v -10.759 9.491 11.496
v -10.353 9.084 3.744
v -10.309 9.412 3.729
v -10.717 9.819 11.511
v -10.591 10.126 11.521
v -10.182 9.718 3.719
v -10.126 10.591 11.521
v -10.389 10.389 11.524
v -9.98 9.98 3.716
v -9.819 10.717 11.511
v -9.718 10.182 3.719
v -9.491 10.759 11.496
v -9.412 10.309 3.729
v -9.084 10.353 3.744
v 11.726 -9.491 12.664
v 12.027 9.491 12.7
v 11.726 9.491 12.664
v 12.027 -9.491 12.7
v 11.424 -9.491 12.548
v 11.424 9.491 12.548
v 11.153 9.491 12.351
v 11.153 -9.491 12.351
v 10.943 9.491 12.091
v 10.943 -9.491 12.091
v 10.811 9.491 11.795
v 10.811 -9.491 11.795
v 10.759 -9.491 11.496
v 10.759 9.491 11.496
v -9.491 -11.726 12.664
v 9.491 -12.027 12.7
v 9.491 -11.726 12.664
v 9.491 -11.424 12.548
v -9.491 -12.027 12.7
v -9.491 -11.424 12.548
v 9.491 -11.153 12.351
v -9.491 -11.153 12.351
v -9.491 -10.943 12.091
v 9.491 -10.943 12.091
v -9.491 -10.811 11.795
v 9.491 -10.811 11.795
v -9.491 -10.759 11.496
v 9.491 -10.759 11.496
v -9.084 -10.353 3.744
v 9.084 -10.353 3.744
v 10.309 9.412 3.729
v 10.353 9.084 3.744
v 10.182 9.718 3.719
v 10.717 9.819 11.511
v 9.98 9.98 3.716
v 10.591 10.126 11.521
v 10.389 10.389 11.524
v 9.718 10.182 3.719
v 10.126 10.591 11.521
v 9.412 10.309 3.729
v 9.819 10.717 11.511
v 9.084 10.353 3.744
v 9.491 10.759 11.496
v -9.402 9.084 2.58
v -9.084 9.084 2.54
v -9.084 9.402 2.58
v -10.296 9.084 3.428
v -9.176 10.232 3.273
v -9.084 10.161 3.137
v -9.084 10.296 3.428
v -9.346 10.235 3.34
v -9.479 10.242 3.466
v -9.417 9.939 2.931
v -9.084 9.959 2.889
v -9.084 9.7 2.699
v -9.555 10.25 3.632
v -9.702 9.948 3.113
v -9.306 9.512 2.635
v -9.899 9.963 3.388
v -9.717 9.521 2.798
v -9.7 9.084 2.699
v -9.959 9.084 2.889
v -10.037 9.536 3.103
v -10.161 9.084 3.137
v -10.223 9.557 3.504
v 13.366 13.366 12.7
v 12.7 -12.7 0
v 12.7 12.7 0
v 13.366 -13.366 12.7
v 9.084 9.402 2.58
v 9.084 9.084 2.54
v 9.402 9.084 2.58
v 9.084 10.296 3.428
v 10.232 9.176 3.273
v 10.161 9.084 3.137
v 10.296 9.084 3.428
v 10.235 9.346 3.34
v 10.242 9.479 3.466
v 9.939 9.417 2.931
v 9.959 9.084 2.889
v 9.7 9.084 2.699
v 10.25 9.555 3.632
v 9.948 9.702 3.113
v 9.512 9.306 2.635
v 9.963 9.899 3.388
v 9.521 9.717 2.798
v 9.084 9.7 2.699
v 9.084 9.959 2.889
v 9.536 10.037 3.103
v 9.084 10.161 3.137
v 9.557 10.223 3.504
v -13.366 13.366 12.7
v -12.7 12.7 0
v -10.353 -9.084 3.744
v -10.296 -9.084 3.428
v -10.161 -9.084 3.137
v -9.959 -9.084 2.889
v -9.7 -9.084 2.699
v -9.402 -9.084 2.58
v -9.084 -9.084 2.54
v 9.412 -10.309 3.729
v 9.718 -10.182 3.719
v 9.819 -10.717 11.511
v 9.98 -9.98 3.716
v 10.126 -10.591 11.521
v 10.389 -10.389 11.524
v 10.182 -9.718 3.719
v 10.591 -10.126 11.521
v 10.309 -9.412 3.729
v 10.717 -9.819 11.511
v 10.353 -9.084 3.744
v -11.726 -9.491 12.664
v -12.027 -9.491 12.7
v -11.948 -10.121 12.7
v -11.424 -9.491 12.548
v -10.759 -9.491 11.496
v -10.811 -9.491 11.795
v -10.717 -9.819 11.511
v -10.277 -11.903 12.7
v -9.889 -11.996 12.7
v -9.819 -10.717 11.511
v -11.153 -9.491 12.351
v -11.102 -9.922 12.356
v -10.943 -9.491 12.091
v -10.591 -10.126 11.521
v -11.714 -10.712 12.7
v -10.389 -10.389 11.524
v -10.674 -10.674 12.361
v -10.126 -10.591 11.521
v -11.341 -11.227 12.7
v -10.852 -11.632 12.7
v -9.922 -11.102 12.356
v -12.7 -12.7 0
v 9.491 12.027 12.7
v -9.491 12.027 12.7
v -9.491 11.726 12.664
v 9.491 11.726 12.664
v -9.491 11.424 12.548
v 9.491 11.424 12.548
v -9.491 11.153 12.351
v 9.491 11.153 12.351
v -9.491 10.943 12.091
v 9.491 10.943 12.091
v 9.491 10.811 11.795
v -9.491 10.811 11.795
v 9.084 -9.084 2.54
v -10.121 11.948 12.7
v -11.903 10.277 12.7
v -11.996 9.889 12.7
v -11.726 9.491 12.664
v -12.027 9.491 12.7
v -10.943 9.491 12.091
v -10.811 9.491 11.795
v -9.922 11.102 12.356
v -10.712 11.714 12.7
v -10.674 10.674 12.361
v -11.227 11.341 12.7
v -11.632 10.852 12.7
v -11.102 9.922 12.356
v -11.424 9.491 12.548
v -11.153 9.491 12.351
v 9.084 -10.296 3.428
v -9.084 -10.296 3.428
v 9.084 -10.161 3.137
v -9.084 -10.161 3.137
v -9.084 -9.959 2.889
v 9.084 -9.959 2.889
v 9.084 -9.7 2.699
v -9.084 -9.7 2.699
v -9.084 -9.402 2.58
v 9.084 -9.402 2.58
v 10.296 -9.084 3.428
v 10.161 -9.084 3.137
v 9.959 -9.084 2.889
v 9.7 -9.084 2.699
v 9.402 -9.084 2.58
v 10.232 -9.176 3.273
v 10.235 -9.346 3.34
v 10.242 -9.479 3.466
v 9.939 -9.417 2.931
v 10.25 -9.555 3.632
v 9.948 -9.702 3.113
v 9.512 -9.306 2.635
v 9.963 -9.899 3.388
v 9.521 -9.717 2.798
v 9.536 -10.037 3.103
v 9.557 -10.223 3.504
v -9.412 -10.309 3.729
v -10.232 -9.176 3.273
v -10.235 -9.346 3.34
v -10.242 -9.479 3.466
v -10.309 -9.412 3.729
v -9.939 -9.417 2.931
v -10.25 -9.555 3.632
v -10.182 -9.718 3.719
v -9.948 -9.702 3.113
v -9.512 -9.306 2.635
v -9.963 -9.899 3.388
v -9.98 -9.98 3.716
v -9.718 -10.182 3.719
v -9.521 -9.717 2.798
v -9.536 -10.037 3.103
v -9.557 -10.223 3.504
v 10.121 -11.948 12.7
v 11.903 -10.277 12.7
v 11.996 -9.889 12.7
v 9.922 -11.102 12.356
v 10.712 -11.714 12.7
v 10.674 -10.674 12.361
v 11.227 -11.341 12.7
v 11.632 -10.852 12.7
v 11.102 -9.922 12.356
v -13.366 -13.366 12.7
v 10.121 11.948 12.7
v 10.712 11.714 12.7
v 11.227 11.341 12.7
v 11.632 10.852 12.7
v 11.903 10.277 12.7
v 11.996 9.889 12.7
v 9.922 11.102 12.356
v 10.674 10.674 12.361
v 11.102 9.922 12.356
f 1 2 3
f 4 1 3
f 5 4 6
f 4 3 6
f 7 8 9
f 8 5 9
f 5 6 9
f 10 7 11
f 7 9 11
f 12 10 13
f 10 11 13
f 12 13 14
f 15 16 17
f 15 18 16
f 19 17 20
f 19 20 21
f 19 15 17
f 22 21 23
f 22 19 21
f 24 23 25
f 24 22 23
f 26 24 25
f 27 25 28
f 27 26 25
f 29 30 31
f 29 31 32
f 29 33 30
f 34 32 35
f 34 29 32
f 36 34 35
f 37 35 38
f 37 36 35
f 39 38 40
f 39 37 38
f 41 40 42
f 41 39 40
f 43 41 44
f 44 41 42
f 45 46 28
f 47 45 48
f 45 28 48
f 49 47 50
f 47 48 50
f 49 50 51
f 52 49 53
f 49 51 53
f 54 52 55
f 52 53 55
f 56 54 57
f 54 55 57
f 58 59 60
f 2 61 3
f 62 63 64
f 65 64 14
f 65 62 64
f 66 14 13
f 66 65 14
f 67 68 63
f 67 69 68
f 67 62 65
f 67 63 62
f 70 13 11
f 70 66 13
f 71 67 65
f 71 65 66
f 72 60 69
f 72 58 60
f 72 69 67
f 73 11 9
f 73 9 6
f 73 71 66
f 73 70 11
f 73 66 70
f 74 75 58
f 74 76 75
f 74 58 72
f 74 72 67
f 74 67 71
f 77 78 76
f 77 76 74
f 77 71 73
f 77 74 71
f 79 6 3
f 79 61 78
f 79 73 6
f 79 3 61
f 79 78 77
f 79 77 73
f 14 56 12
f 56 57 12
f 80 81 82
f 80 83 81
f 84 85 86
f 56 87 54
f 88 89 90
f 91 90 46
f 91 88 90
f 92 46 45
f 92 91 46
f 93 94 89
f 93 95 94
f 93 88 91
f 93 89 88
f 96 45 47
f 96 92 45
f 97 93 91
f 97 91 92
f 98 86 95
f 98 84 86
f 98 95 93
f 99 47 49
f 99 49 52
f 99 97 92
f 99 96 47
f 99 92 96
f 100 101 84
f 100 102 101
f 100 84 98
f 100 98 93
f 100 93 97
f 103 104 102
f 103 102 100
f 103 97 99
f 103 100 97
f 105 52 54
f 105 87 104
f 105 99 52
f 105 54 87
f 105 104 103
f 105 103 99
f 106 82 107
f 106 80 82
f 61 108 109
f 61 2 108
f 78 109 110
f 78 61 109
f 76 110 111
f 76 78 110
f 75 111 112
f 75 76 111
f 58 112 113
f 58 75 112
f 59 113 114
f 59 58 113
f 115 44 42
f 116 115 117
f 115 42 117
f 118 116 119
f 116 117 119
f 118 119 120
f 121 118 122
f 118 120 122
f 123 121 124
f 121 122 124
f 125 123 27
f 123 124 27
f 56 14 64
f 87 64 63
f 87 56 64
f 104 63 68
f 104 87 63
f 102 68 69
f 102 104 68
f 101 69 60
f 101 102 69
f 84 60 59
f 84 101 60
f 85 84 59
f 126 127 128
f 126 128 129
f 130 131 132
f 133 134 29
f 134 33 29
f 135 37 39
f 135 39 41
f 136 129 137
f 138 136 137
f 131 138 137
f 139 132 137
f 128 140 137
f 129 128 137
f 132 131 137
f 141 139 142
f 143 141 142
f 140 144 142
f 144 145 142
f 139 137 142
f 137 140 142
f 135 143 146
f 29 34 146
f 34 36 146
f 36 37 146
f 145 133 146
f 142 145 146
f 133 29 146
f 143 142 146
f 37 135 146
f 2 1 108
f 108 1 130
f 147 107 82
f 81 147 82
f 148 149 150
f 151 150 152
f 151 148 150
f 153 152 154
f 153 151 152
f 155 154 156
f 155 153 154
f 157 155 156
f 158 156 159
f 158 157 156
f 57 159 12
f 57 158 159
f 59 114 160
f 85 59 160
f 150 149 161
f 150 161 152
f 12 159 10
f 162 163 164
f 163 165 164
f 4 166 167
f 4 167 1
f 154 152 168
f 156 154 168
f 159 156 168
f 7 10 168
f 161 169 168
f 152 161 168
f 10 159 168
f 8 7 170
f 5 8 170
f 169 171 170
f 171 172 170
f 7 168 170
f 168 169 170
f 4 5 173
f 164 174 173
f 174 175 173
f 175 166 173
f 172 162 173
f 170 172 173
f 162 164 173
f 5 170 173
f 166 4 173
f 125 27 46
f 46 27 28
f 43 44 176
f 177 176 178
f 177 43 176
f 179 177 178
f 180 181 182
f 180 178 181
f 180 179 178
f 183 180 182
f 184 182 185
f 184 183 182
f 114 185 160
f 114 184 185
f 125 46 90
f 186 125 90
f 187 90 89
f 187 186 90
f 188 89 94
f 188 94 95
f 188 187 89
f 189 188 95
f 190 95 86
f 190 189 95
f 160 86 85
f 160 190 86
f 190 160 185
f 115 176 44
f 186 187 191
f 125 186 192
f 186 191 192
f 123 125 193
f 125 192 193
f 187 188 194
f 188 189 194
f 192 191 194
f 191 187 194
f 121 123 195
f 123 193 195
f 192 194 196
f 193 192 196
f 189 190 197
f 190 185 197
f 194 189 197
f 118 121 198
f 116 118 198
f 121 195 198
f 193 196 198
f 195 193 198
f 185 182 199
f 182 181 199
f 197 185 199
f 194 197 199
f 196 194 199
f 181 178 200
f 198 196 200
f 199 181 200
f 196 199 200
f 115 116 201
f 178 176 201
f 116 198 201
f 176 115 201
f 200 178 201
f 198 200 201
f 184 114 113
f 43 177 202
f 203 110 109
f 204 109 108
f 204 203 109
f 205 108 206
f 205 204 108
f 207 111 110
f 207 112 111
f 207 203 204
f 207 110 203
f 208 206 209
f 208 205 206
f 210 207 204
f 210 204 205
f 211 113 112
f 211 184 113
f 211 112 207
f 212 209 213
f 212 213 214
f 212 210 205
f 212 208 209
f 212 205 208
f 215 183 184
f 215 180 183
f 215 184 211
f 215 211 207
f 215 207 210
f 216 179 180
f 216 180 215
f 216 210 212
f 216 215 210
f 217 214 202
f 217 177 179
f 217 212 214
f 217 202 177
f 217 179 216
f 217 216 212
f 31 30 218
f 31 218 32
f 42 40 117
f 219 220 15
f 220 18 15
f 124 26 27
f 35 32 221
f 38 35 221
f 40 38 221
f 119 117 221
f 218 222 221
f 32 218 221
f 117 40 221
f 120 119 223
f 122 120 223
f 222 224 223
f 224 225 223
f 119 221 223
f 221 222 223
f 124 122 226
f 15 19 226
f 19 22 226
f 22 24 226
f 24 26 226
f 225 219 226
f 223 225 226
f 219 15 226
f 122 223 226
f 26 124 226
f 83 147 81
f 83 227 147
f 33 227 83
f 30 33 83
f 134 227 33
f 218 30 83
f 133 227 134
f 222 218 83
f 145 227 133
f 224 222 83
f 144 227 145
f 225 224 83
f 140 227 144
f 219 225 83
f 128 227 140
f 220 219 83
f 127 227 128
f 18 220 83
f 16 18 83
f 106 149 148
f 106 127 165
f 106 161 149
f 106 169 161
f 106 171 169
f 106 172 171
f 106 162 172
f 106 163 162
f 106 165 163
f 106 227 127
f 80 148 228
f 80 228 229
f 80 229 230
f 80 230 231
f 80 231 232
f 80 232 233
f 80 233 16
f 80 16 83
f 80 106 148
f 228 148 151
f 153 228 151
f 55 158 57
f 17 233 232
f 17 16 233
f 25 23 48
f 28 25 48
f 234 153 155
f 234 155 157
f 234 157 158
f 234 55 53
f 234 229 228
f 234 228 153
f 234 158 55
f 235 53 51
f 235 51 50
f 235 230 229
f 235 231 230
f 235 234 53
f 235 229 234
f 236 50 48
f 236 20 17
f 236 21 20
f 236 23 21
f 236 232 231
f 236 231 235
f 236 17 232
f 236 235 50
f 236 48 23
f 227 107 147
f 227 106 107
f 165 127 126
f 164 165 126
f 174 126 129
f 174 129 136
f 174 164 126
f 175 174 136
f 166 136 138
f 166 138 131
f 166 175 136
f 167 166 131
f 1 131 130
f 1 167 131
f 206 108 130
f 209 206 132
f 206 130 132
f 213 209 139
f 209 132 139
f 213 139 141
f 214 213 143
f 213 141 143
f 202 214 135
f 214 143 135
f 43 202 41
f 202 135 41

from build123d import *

# Parameters (mm, degrees)
F0_W     = 25.4
F0_H     = 25.4
F1_DEPTH = 12.7
F1_TAPER = -3
F2_T     = -2.54
F3_R     = 1.27


with BuildPart() as f1:
    # F0 (on Top) → F1 (new body)
    with BuildSketch(Plane.XY):
        Rectangle(F0_W, F0_H)
    extrude(amount=F1_DEPTH, taper=F1_TAPER)

    # F2
    f2_openings = [f1.faces().sort_by_distance(p)[0] for p in [
        (0, 0, 12.7),
    ]]
    offset(amount=F2_T, openings=f2_openings)

    # F3
    f3_edges = [f1.edges().sort_by_distance(p)[0] for p in [
        (0, -10.28963, 2.54),
        (-10.28963, 0, 2.54),
        (0, 10.28963, 2.54),
        (10.28963, 0, 2.54),
        (0, 10.822093, 12.7),
        (-10.822093, 0, 12.7),
        (0, -10.822093, 12.7),
        (10.822093, 0, 12.7),
        (-10.555862, -10.555862, 7.62),
        (10.555862, -10.555862, 7.62),
        (10.555862, 10.555862, 7.62),
        (-10.555862, 10.555862, 7.62),
    ]]
    fillet(f3_edges, radius=F3_R)


solid = f1.part
